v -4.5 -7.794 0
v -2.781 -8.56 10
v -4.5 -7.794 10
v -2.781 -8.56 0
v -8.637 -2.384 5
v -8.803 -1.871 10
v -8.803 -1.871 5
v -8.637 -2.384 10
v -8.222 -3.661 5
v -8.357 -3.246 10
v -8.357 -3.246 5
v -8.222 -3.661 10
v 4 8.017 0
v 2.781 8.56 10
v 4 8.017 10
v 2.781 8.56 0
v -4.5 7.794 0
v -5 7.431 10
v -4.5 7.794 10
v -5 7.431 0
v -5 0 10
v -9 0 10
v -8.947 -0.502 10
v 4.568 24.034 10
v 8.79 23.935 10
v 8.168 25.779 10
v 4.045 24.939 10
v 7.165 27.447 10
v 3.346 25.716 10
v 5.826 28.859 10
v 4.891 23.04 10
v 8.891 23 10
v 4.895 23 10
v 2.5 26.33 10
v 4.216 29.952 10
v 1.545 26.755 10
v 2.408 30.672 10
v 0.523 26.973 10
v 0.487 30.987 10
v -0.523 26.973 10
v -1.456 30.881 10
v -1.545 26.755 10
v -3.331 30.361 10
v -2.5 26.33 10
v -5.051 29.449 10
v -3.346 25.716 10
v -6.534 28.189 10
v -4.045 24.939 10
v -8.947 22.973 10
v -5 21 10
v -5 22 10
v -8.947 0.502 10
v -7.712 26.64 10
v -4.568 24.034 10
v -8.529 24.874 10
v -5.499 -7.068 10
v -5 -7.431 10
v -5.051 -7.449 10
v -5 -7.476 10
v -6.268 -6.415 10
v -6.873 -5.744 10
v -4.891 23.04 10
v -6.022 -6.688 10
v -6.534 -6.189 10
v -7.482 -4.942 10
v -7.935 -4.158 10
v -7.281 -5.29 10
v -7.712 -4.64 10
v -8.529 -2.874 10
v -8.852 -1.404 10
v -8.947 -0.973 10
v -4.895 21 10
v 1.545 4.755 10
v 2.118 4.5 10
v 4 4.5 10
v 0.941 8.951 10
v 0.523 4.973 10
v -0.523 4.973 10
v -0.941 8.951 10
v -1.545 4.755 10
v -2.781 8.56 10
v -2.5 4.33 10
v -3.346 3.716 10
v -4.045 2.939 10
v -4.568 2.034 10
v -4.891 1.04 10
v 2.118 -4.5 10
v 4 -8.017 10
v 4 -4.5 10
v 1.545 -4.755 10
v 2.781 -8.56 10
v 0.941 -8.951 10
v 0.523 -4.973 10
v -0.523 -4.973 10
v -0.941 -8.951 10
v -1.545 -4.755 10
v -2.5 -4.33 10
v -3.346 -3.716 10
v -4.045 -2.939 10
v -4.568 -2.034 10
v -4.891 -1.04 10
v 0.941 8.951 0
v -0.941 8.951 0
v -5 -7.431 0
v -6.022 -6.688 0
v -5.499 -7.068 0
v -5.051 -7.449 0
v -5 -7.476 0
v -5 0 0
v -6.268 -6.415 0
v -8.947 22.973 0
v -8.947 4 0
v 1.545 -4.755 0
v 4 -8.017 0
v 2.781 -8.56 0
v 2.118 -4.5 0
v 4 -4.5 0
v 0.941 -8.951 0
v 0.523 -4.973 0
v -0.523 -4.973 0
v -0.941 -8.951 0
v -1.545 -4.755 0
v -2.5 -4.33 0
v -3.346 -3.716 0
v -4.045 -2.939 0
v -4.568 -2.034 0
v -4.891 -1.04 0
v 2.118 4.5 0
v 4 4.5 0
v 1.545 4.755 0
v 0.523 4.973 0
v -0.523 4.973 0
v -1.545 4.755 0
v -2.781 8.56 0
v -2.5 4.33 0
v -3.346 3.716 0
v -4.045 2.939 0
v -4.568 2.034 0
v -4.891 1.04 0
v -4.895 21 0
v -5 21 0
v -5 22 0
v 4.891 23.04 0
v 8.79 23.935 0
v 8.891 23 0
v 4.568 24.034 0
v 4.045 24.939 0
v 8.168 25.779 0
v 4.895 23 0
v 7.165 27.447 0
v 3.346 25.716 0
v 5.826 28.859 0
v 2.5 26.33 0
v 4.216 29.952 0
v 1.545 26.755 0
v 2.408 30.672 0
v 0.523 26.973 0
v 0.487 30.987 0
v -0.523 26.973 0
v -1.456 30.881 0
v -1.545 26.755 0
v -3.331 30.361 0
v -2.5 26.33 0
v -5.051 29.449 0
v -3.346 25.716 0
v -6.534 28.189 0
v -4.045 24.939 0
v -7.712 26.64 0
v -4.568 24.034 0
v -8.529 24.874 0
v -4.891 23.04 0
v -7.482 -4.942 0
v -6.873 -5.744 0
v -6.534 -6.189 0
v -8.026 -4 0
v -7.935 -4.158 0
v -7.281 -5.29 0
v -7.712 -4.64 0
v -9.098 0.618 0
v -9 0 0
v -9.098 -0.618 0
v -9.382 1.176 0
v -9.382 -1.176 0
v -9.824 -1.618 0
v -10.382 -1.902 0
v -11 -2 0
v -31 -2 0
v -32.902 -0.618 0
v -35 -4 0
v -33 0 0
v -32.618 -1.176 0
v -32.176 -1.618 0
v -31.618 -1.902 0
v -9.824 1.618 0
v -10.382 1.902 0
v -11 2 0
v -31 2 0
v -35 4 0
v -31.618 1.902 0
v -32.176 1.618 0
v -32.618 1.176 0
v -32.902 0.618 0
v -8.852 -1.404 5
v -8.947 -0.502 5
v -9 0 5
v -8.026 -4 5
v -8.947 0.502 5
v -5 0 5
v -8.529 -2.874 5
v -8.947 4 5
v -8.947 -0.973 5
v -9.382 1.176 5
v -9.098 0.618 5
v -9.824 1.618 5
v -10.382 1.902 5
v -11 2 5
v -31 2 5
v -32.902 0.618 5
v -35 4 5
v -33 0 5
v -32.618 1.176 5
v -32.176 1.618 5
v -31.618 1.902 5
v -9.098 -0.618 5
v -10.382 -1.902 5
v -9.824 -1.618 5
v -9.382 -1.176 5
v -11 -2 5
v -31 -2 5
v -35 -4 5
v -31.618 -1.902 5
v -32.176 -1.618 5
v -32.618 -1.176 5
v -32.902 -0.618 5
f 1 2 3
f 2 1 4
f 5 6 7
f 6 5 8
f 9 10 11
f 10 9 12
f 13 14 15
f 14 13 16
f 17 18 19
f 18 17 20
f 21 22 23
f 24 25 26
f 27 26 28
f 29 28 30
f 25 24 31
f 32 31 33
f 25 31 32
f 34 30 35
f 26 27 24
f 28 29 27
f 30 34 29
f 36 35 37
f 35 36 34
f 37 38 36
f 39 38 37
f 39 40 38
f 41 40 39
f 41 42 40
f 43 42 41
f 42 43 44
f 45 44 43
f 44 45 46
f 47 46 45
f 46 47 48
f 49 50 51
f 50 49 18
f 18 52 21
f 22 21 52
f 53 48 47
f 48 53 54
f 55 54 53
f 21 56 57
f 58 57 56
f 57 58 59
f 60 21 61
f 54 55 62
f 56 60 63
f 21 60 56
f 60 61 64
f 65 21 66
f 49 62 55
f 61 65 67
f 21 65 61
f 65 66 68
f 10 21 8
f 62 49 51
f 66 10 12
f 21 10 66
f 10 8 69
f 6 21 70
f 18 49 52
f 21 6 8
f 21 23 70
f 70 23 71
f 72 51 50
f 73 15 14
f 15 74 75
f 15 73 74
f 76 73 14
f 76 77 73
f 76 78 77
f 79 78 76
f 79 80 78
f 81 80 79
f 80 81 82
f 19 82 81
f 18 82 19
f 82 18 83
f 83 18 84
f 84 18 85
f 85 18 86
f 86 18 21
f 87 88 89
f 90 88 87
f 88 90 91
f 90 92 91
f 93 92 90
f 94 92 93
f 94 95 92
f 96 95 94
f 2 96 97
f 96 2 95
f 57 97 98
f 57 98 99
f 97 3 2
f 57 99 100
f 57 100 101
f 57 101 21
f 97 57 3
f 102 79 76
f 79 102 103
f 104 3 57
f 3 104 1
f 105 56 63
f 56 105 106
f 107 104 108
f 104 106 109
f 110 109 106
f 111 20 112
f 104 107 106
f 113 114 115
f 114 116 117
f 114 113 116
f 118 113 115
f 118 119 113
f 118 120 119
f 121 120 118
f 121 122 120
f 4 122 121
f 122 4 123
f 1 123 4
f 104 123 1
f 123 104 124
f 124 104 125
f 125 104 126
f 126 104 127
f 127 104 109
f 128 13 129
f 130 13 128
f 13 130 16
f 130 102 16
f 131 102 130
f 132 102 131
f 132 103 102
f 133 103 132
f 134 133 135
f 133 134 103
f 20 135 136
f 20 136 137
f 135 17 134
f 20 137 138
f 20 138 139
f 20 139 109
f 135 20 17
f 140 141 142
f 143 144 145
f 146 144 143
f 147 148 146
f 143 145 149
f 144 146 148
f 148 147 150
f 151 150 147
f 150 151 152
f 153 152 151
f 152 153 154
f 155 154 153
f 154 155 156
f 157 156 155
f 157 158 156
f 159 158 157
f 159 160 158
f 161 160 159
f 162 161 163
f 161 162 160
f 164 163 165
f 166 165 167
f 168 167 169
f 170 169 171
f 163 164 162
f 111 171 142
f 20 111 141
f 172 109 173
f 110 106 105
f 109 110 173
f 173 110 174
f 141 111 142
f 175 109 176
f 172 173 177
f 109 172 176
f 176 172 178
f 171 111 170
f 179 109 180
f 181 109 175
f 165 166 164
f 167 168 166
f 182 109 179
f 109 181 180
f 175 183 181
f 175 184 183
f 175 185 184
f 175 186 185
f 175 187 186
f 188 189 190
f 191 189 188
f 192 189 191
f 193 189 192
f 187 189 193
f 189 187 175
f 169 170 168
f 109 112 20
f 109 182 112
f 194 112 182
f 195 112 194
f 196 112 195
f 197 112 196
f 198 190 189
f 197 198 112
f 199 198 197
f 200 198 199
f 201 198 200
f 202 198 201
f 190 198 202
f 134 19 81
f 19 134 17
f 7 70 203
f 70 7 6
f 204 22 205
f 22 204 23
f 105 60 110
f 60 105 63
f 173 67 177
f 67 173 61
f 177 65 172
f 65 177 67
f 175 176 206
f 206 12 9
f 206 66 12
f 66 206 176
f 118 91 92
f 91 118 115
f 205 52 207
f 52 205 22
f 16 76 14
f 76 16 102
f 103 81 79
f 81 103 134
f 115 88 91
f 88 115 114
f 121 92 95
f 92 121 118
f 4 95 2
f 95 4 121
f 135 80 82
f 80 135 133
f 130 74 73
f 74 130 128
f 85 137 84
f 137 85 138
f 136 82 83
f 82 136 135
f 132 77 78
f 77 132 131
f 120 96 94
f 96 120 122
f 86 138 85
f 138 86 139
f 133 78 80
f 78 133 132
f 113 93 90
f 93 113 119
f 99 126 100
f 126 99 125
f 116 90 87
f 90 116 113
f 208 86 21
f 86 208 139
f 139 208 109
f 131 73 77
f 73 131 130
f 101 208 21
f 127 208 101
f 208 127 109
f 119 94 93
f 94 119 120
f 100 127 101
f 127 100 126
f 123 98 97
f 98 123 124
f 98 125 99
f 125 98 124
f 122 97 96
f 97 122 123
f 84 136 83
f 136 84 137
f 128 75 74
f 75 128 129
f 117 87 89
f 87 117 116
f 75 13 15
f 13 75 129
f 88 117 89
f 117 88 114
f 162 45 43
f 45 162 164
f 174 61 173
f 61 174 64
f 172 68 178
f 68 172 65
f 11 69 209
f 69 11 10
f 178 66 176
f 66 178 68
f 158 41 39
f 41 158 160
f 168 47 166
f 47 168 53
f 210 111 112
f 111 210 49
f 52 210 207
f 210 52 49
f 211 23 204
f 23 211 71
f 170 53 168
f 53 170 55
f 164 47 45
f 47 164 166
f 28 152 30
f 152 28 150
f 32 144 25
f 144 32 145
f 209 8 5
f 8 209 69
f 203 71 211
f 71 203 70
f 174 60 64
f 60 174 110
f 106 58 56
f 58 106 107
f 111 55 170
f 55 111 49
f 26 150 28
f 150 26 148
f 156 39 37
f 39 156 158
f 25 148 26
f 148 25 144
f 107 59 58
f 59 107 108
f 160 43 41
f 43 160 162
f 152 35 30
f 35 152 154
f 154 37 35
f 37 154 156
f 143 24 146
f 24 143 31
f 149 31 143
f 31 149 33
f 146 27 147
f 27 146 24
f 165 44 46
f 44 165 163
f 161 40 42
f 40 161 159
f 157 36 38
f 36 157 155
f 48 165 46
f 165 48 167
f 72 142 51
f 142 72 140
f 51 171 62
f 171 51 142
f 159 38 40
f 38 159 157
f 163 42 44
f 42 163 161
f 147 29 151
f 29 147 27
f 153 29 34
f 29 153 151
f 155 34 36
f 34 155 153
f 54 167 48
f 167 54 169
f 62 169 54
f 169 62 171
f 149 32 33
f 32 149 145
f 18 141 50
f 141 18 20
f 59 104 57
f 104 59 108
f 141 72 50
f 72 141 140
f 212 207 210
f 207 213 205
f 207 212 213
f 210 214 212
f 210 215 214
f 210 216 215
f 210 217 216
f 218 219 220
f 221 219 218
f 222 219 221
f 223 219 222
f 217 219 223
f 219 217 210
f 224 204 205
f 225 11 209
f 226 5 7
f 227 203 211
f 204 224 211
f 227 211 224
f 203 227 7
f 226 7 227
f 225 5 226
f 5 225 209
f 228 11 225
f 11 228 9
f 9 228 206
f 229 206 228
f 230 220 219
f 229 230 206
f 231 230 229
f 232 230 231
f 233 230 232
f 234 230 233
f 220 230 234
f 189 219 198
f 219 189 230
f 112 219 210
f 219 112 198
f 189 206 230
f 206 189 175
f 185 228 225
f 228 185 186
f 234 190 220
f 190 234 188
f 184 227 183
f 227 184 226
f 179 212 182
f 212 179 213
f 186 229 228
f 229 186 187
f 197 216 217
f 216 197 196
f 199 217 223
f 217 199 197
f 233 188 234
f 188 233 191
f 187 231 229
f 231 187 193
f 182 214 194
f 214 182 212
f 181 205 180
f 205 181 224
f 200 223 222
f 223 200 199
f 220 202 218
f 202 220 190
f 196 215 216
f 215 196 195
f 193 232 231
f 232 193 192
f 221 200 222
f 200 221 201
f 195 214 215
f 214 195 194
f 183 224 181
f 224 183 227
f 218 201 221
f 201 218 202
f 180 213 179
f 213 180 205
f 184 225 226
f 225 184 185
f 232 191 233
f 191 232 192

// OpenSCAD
module y_clip() {

  thickness = 10;
  rod = 10;
  length = 30;

  *cylinder(r=11, h=thickness, $fn=30);
  difference() {
    cylinder(r=9, h=thickness, $fn=30);
    cylinder(r=rod/2, h=thickness+2, $fn=30);
    translate([0, -(rod - 1) / 2, 0]) cube([10, rod - 1, thickness]);
    translate([(rod / 2) - 1, -15, 0]) cube([10, 30, thickness]);
  }

  translate([2, -9, 0]) difference() {
    hull() {
      translate(v = [-2,10-1,0]) cylinder(h = 10, r=9);
      translate(v = [-2,30+1,0]) cylinder(h = 10, r=9);
    }
    translate(v = [-2,10-1,-1]) cylinder(r=rod/2, h=thickness+2, $fn=30);	
    translate(v = [-2,30+1,-1]) cylinder(r=rod/2, h=thickness+2, $fn=30);
    translate([0,-8,0]) cube([10,40,10]);
    translate([-7,-10,0]) cube([10,40,10]);
  }


  difference() {
    translate([-length-rod/2, -8/2, 0]) cube([length, 8, 5]);
    hull() for(i=[0:4]) translate([-length-rod/2+3+(i*5)+1,0,0]) cylinder(r=4/2, h=6, $fn=20);
  }
}

y_clip();

module x_clip() {
  thickness = 20;
  rod = 8.3;
  holes_distance = 19; // between the two screw holes on the switch.
  slit_height = 4;
  
  difference() {
    union() {
      translate([-3-rod/2,-(holes_distance+6)/2,0]) cube([4, holes_distance+6, thickness]);
      cylinder(r=rod/2 + 2, h=thickness);
    }
    cylinder(r=rod/2, h=thickness);
    translate([0,0,thickness-6]) difference() {
      cylinder(r=rod/2 + 4, h=slit_height);
      cylinder(r=rod/2 + 2, h=slit_height);
    }
    translate([0, -(rod - 1) / 2, 0]) cube([10, rod - 1, thickness]);
    translate([(rod / 2) - 1, -(rod + 4) / 2, 0]) cube([10, rod + 4, thickness]);

    for(i=[-1,1]) translate([-20,i*(holes_distance/2),4]) rotate([0,90,0]) cylinder(r = 4/2, h = 20);
    translate([-11,-15,9]) rotate([0,45,0]) cube([4,30,4]);
  }
}

*x_clip();

module z_clip() {
  thickness = 30;
  rod = 8.3;
  holes_distance = 19; // between the two screw holes on the switch.
  slit_height = 4;
  
  difference() {
    union() {
      translate([-3-rod/2,-(holes_distance+6)/2,0]) cube([4, holes_distance+6, thickness]);
      cylinder(r=rod/2 + 2, h=thickness);
    }
    cylinder(r=rod/2, h=thickness);
    #for(z=[thickness/2-slit_height/2, thickness-6]) translate([0,0,z]) difference() {
      cylinder(r=rod/2 + 4, h=slit_height);
      cylinder(r=rod/2 + 2, h=slit_height);
    }
    translate([0, -(rod - 1) / 2, 0]) cube([10, rod - 1, thickness]);
    translate([(rod / 2) - 1, -(rod + 4) / 2, 0]) cube([10, rod + 4, thickness]);

    for(i=[-1,1]) translate([-20,i*(holes_distance/2),4]) rotate([0,90,0]) cylinder(r = 4/2, h = 20);
    translate([-11,-15,9]) rotate([0,45,0]) cube([4,30,4]);
  }
}

*z_clip();
